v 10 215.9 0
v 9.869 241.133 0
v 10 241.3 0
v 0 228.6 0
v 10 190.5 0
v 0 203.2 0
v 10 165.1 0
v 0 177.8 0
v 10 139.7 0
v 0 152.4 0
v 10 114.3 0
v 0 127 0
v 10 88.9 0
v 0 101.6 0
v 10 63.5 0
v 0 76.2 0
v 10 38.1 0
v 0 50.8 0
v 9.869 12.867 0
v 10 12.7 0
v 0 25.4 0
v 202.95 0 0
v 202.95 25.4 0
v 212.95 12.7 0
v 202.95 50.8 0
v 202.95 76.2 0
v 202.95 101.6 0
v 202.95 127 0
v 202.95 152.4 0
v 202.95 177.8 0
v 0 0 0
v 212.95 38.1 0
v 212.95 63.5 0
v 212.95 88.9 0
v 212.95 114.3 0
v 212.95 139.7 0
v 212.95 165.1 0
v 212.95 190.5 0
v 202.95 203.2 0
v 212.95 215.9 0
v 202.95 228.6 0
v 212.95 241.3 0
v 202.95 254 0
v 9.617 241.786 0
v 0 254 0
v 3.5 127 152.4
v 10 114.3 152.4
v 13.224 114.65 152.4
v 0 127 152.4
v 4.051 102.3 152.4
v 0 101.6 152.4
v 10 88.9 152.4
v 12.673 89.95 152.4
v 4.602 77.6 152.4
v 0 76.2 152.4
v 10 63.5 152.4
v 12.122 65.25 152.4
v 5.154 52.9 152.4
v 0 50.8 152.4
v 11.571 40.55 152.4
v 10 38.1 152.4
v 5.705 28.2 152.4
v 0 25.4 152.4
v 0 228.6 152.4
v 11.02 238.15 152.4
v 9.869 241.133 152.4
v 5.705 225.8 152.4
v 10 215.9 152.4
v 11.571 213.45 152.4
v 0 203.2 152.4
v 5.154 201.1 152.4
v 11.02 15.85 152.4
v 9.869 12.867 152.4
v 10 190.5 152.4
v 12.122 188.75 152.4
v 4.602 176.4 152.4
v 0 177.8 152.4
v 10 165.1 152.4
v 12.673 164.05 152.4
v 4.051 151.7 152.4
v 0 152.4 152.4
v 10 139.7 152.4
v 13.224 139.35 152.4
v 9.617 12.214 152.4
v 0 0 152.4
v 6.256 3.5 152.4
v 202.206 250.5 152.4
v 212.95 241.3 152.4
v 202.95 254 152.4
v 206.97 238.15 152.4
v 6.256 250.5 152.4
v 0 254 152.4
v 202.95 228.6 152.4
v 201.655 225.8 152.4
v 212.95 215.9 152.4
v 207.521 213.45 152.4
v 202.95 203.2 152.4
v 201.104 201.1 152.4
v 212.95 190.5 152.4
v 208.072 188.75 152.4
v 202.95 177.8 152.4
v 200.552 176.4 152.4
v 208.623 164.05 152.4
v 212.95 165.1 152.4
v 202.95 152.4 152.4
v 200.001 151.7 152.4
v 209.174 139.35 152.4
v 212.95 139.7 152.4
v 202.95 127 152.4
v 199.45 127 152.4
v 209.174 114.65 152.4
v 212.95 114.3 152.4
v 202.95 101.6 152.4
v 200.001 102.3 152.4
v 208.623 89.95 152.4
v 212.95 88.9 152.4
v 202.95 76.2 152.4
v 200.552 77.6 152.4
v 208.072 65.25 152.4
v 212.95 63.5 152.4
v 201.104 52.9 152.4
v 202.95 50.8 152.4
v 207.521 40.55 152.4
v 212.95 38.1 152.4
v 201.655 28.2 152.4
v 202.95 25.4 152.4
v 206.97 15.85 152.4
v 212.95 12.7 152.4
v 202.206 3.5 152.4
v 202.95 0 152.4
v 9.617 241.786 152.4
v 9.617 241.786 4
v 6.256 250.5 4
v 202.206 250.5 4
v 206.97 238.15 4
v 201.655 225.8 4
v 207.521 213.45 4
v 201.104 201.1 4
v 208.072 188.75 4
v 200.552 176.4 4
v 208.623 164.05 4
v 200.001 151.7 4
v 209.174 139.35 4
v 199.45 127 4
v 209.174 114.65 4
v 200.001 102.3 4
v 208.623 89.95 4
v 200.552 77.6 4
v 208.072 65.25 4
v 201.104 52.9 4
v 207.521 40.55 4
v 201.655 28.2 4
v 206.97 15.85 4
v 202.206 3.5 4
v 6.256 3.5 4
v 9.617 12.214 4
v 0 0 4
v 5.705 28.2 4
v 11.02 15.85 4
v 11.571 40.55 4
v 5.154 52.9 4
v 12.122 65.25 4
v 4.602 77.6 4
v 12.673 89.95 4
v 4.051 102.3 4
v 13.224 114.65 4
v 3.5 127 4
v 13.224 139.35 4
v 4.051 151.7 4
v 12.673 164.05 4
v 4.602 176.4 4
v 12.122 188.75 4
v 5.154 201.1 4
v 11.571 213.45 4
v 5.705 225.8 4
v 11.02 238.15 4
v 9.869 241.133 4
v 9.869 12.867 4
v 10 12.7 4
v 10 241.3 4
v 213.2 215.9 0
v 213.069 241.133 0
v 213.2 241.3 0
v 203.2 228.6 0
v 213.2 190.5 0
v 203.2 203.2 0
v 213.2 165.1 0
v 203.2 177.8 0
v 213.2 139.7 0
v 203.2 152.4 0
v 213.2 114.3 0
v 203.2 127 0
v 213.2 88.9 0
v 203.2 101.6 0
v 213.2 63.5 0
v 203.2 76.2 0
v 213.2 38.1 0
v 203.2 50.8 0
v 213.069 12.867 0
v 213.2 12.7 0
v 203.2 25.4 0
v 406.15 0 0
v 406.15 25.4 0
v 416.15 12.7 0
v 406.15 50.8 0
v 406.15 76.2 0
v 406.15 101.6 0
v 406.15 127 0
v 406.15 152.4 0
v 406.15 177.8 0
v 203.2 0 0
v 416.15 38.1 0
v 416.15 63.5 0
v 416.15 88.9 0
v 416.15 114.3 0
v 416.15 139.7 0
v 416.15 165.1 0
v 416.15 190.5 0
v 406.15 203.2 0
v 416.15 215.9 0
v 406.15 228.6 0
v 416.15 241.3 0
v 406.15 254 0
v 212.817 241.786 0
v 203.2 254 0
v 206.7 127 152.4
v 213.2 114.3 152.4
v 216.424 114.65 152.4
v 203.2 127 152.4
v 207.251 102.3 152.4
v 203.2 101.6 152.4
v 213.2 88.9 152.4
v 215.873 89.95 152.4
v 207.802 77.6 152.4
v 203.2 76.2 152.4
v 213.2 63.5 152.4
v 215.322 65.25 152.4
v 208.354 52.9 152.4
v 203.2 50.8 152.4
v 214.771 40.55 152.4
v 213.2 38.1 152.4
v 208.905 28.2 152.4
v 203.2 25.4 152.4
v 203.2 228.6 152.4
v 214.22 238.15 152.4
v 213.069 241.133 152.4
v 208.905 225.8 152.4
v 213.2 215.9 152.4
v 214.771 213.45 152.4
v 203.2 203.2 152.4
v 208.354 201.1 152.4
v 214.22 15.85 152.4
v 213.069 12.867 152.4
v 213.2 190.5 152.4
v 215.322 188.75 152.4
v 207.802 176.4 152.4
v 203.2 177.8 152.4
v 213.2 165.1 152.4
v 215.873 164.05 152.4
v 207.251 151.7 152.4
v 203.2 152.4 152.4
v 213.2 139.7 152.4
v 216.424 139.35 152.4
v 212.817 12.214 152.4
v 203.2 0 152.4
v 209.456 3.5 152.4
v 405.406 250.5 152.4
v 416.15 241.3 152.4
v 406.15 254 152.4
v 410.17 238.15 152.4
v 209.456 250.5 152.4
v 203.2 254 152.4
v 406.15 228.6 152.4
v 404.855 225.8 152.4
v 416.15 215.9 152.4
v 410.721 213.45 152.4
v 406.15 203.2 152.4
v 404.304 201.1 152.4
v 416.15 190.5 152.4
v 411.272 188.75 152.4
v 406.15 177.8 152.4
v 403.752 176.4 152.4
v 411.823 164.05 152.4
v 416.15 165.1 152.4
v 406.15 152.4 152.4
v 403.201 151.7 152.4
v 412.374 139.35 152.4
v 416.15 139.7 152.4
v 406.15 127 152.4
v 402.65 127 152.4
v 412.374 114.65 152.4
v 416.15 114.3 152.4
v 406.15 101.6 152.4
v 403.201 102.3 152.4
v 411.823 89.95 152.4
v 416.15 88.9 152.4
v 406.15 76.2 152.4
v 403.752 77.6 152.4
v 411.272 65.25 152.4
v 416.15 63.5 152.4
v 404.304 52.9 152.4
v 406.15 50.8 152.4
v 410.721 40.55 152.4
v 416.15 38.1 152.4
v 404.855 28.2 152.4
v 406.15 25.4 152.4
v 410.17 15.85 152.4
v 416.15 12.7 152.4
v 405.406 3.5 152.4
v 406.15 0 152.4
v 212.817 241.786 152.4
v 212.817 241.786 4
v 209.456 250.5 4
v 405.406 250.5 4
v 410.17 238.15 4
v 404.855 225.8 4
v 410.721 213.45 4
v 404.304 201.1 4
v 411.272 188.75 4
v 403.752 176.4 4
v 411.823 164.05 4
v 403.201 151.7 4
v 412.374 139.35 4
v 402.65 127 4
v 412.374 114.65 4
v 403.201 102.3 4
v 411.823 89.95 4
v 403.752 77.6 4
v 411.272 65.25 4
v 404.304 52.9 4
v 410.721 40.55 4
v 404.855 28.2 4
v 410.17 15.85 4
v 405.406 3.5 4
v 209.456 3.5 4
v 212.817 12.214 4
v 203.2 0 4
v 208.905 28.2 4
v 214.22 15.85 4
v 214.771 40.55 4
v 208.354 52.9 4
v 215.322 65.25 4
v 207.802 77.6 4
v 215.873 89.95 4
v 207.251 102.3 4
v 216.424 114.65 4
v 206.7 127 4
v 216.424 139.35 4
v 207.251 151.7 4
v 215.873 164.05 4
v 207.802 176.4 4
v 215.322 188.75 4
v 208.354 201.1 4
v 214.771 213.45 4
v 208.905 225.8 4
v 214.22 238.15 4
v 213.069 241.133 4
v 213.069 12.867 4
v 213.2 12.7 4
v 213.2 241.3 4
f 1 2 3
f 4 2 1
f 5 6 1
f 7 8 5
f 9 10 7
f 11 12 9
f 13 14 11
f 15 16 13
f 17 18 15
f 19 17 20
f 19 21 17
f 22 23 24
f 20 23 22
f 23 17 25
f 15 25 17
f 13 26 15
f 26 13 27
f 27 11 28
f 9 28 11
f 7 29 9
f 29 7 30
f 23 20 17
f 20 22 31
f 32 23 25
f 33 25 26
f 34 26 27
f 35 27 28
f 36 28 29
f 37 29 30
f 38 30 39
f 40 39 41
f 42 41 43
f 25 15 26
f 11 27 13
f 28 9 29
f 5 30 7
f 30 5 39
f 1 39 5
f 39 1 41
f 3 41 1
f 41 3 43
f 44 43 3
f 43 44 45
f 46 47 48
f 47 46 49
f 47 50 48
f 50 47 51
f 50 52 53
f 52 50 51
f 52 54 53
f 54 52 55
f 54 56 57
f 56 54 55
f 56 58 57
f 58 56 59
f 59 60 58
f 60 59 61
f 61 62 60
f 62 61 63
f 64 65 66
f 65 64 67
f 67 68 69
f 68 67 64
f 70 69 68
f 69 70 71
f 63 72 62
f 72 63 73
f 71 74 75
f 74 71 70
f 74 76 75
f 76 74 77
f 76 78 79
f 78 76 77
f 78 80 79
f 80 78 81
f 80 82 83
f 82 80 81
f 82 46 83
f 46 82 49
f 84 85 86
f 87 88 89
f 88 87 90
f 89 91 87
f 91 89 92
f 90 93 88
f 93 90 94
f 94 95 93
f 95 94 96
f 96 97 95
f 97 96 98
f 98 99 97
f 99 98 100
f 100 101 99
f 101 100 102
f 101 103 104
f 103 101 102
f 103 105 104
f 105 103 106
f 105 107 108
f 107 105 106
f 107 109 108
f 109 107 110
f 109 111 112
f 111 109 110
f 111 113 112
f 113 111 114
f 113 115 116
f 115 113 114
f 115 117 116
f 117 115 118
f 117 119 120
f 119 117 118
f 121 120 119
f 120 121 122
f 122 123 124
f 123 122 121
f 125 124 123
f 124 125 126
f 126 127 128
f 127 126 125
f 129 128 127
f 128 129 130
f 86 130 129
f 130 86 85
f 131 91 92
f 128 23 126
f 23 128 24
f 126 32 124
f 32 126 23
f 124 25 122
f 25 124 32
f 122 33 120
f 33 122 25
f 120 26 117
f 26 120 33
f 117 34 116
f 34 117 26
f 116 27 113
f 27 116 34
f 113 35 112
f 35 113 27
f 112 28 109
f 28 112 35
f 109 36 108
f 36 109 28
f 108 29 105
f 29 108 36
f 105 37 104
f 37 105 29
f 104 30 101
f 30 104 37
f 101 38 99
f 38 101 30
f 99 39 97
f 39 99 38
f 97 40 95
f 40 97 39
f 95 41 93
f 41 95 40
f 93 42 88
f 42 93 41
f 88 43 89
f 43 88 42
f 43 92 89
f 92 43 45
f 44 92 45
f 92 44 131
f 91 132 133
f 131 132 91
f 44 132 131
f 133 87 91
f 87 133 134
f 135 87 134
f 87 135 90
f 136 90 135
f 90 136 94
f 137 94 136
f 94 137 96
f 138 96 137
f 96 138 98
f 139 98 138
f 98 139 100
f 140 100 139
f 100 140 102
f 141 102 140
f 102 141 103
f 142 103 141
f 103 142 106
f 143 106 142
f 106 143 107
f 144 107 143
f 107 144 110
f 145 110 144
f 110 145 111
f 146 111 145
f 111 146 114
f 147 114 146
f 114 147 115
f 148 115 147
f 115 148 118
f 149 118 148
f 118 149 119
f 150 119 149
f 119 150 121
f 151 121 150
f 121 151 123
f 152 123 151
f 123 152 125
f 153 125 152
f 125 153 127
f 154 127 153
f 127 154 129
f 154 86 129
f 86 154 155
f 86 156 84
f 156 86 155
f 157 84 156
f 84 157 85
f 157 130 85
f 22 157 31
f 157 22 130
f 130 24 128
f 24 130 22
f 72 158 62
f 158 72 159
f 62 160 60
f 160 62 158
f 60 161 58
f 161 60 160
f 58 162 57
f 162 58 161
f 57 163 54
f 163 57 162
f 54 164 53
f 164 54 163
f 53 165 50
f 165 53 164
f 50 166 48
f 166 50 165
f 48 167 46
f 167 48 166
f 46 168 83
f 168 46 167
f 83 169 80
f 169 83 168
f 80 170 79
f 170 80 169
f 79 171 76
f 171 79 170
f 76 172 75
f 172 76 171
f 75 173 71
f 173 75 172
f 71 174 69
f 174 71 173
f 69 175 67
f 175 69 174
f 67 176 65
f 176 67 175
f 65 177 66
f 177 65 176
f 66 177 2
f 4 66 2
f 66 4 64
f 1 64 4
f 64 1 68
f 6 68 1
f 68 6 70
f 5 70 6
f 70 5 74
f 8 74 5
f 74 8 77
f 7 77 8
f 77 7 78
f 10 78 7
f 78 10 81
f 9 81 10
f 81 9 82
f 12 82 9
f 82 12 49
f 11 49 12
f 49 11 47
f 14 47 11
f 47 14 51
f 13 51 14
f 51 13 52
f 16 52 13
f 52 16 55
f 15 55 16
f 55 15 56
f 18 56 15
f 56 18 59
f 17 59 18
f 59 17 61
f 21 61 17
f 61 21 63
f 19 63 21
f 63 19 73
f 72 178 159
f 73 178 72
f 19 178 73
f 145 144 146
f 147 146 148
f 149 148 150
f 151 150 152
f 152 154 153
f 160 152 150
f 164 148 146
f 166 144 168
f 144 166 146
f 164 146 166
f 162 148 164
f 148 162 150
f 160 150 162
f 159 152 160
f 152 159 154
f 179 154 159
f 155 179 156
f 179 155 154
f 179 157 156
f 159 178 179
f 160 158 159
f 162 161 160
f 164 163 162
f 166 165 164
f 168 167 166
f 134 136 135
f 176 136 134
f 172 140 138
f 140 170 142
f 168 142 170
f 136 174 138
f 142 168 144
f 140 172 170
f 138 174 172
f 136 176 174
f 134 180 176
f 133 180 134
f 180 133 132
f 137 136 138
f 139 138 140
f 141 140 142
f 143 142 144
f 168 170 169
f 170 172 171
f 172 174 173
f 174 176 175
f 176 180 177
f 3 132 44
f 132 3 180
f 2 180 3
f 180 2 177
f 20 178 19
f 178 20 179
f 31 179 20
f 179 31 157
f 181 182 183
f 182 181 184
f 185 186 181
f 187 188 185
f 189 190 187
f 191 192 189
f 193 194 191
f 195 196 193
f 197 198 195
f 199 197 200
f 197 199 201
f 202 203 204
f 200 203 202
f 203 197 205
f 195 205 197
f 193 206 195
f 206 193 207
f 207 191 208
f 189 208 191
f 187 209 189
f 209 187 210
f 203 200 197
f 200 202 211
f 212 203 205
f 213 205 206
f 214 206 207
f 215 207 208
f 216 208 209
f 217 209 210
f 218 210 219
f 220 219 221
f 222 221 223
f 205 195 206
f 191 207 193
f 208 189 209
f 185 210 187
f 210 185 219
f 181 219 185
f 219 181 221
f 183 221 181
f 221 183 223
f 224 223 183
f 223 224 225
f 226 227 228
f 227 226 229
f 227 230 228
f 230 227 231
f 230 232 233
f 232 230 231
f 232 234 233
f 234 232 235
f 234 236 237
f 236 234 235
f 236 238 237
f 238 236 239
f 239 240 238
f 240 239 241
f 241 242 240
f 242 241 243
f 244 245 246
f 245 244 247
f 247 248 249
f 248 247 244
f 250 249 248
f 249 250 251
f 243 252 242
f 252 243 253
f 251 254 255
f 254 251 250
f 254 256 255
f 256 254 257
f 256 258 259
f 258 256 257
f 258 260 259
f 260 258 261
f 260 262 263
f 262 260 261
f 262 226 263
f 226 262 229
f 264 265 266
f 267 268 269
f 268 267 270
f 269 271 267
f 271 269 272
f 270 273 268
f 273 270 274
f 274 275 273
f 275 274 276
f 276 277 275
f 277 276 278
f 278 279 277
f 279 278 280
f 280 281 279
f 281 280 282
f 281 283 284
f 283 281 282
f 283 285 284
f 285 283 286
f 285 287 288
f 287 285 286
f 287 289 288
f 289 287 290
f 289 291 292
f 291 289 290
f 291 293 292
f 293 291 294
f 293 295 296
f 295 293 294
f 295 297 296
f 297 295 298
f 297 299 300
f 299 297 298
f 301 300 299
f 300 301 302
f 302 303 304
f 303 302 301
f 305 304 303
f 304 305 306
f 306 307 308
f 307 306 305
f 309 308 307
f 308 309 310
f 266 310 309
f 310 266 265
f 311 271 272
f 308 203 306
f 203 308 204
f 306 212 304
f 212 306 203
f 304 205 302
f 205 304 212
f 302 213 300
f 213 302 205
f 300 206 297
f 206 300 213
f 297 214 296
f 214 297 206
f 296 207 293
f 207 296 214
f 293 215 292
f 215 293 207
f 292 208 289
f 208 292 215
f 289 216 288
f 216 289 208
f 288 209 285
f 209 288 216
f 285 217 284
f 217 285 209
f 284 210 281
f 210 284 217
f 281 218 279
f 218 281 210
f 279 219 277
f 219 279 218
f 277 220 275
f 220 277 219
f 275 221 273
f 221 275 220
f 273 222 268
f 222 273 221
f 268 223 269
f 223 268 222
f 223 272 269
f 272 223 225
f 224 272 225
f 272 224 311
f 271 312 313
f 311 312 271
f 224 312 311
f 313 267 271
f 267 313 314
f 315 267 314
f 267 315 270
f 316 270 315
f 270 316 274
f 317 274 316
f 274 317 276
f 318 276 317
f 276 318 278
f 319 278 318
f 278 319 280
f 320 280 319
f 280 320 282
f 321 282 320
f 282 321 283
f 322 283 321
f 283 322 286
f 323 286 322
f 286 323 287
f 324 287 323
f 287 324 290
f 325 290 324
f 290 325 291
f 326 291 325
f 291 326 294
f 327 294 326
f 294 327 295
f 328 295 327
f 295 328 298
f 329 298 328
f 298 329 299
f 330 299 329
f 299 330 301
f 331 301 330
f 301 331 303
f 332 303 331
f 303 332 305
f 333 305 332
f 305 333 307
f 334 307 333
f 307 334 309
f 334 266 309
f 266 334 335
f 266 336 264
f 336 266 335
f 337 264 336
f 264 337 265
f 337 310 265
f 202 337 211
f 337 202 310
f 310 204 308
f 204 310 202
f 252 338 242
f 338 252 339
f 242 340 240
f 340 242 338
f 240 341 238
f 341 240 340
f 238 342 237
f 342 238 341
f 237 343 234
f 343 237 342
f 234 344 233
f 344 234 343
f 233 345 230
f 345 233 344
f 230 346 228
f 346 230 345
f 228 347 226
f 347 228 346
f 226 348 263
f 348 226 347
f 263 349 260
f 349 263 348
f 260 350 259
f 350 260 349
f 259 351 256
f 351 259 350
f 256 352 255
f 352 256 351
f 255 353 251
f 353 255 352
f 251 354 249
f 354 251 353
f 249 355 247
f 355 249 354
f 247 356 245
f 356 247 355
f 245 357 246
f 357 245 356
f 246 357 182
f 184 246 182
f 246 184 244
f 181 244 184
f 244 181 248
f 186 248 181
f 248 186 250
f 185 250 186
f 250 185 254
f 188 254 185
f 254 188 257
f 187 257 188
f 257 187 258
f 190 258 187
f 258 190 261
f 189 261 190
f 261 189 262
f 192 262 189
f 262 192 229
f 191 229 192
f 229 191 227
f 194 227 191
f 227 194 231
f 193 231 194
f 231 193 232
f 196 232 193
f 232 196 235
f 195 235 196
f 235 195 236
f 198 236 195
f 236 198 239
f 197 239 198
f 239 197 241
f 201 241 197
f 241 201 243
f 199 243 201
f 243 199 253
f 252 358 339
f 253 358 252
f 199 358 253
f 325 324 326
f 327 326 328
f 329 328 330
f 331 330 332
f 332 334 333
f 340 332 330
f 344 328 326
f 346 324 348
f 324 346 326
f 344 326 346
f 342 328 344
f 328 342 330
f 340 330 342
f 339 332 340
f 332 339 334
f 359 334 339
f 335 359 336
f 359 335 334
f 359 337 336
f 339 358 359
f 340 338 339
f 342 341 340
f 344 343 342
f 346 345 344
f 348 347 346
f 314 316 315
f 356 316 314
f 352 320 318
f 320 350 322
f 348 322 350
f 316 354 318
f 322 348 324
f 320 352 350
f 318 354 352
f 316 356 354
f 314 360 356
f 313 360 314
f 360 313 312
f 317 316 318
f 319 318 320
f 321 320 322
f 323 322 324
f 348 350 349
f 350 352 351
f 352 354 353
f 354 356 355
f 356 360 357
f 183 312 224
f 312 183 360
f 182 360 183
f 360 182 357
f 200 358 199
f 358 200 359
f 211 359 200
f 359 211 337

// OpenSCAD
// Test 3D assembly of 2 interlocking modules
module_height_in = 10;
module_width_in = 8;
module_depth_in = 6;

wall_thickness = 3.5;
back_thickness = 4.0;
zig_cycle_height = 25.4;
zig_amplitude = 10;
interlock_clearance = 0.25;

H = module_height_in * 25.4;
W = module_width_in * 25.4;
D = module_depth_in * 25.4;

num_cycles = max(1, round(H / zig_cycle_height));

function zig_x(z, H, num_cycles, amp) = 
    let (
        cycle_h = H / num_cycles,
        phase = (z % cycle_h) / cycle_h,
        tri = (phase < 0.5) ? (phase * 2) : ((1 - phase) * 2)
    ) tri * amp;

function outer_profile(W, H, num_cycles, amp, clearance) =
    concat(
        [ for (i = [0 : num_cycles * 2]) 
            let (z = i * (H / (num_cycles * 2)))
            [ zig_x(z, H, num_cycles, amp), z ] 
        ],
        [ for (i = [num_cycles * 2 : -1 : 0]) 
            let (z = i * (H / (num_cycles * 2)))
            [ W + zig_x(z, H, num_cycles, amp) - clearance, z ] 
        ]
    );

function inner_profile(W, H, wall, num_cycles, amp, clearance) =
    concat(
        [ for (i = [0 : num_cycles * 2]) 
            let (z = wall + i * ((H - 2*wall) / (num_cycles * 2)))
            [ wall + zig_x(z, H, num_cycles, amp), z ] 
        ],
        [ for (i = [num_cycles * 2 : -1 : 0]) 
            let (z = wall + i * ((H - 2*wall) / (num_cycles * 2)))
            [ W - wall + zig_x(z, H, num_cycles, amp) - clearance, z ] 
        ]
    );

module module_box() {
    union() {
        // Main hollow shell extruded along Y
        linear_extrude(height = D) {
            difference() {
                polygon(outer_profile(W, H, num_cycles, zig_amplitude, interlock_clearance));
                polygon(inner_profile(W, H, wall_thickness, num_cycles, zig_amplitude, interlock_clearance));
            }
        }
        // Back wall plate
        linear_extrude(height = back_thickness) {
            polygon(outer_profile(W, H, num_cycles, zig_amplitude, interlock_clearance));
        }
    }
}

// Render Module 1 (Cyan)
color([0.2, 0.7, 0.9]) module_box();

// Render Module 2 (Orange) - placed at X = W
translate([W, 0, 0])
color([0.9, 0.5, 0.2]) module_box();
